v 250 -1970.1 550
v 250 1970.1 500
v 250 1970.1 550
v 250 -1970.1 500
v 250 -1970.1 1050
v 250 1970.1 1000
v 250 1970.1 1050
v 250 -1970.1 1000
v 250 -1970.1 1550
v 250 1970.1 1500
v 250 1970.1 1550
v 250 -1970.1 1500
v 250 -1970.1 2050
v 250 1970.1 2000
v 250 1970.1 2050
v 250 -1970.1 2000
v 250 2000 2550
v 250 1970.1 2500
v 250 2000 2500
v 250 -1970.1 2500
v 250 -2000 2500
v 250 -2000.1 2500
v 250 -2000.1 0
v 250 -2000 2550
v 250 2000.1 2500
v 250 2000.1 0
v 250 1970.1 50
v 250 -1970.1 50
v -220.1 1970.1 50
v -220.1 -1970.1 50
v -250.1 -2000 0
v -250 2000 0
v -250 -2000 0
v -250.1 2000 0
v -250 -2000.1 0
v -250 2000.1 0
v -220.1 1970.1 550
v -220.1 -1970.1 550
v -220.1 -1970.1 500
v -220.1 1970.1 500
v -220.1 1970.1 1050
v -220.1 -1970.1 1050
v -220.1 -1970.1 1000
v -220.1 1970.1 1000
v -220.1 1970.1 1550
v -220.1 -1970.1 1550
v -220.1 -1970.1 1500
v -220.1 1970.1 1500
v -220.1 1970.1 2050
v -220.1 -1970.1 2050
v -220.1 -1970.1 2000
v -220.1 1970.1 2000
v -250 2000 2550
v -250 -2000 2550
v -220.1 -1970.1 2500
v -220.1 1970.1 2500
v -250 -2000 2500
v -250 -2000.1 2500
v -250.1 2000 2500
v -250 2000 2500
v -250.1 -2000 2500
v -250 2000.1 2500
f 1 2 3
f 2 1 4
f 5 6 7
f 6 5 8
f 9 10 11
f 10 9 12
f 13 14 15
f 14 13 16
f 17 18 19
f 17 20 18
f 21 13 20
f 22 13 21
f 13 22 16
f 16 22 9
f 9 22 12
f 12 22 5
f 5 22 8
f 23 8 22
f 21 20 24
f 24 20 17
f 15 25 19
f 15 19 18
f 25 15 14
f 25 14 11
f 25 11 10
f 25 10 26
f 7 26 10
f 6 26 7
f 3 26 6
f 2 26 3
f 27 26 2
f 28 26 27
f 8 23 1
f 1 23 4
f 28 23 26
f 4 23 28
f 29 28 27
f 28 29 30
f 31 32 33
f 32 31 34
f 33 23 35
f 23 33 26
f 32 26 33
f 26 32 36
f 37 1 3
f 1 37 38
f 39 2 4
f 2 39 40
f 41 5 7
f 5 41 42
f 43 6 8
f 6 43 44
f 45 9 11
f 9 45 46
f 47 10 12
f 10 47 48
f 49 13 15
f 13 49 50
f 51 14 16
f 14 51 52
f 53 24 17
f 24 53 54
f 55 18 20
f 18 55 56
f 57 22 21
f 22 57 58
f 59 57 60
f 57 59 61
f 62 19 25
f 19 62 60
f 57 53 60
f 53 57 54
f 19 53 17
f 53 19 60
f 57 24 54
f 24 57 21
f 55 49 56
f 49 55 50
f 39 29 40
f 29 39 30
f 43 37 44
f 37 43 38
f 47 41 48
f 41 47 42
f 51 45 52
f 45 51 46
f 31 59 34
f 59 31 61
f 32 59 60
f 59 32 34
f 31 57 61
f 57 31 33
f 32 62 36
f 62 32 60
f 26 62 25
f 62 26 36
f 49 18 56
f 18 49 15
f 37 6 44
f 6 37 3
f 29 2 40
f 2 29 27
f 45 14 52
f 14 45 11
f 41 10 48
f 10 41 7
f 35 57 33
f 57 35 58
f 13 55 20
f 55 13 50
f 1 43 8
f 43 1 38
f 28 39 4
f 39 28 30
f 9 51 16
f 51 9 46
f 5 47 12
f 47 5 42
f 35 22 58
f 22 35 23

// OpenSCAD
// file: barhocker.scad
//barhocker();
//eps = 1;
//fn = 40;

module barhocker( foot_diameter=500, foot_height=50,
                  foot_rest_diameter = 400, foot_rest_height = 300, foot_rest_thickness = 20,
                  pillar_diameter=70, pillar_height=800,
                  seat_diameter=400, seat_height=130 ) 
{
  color( [0.9, 0.9, 0.9] ) 
    cylinder( d=foot_diameter, h=foot_height, center=false, $fn=fn );
  color( [0.9, 0.9, 0.9] ) 
    translate( [0,0,foot_height-eps] )
      cylinder( d=pillar_diameter, h=pillar_height, center=false, $fn=fn );
  color( [0.9, 0.9, 0.9] ) 
    difference() {
      translate( [0,0,foot_rest_height] )
        cylinder( d=foot_rest_diameter, h=foot_rest_thickness, center=false, $fn=fn );
      translate( [0,0,foot_rest_height-eps] )
        cylinder( d=foot_rest_diameter-2*foot_rest_thickness, 
                  h=foot_rest_thickness+4*eps, center=false, $fn=fn );
      }
  color( [0.6, 0.2, 0.2] ) 
    translate( [0,0,foot_height+pillar_height-eps] )
      cylinder( d=seat_diameter, h=seat_height, center=false, $fn=fn );
}
// main file
fn = 50;
eps = 0.1;

include <barhocker.scad>;



// scale( [0.001, 0.001, 0.001] ) 
  //bartresen();


//translate( [-2.0,0,0] )
//  // scale( [0.001, 0.001, 0.001] ) 
    cupboard();

/*

//translate( [-1.0, -4.0,,0] )
//  scale( [0.001, 0.001, 0.001] ) side_barrier();
translate( [-1.0, +2.5,,0] )
  scale( [0.001, 0.001, 0.001] ) side_barrier();

translate( [1.0, -1.0, 0.0] )
  scale( [0.001, 0.001, 0.001] ) barhocker();
translate( [1.0, 0.0, 0.0] )
  scale( [0.001, 0.001, 0.001] ) barhocker();
translate( [1.0, 1.0, 0.0] )
  scale( [0.001, 0.001, 0.001] ) barhocker();
*/



module bartresen(
  tresen_length = 3000,
  tresen_width  =  800,
  tresen_height = 1200,
  base_height = 50,        // height of bottom/footer part of the Tresen
  counter_height = 100,    // height of upper table-plate of the Tresen
  inset_height = 500, // clear height of one cupboard on robot side
)
{
  dx = 300; 
  difference() {
    union() {
      color( [0.6, 0.4, 0.2] ) 
        translate( [0,0,tresen_height/2] ) 
          cube( size=[tresen_width, tresen_length, tresen_height], center=true );
      color( [0.6, 0.4, 0.2] ) 
        translate( [0,tresen_length/2,tresen_height/2] ) 
          cylinder( d=tresen_width, h=tresen_height-eps, center=true, $fn = fn );
      color( [0.6, 0.4, 0.2] ) 
        translate( [0,-tresen_length/2,tresen_height/2] ) 
          cylinder( d=tresen_width, h=tresen_height-eps, center=true, $fn = fn );
    }
    translate( [tresen_width/2-dx/2+eps,0,tresen_height/2-base_height/2] )
      cube( size=[dx+10*eps, tresen_length+tresen_width+eps, tresen_height-counter_height-base_height], center=true );

    translate( [-tresen_width/2+dx/2-eps,0,base_height+inset_height/2] )
      cube( size=[dx, tresen_length+tresen_width+eps, inset_height], center=true );
    translate( [-tresen_width/2+dx/2-eps,0,base_height+inset_height+base_height+inset_height/2] )
      cube( size=[dx, tresen_length+tresen_width+eps, inset_height], center=true );
     
  }
}


module cupboard(
  cupboard_length= 4000,
  cupboard_width = 500,
  cupboard_height= 2500,
  base_height    = 50,
  inset_height   = 500,
  wall_thickness = 30,
)
{
  color( [0.6, 0.4, 0.2] ) 
    for( dx=[0:inset_height:cupboard_height] )
      translate( [0,0,base_height/2+dx] )
        cube( size=[cupboard_width,cupboard_length,base_height], center=true );
  // rear wall
  color( [0.6, 0.4, 0.2] ) 
    translate( [-cupboard_width/2+wall_thickness/2-eps,0,cupboard_height/2] )
      cube( size=[wall_thickness, cupboard_length, cupboard_height], center=true );  
  // side walls
  color( [0.6, 0.4, 0.2] ) 
    translate( [0,cupboard_length/2-wall_thickness/2+eps,cupboard_height/2] )
      cube( size=[cupboard_width, wall_thickness, cupboard_height], center=true );  
  color( [0.6, 0.4, 0.2] ) 
    translate( [0,-cupboard_length/2+wall_thickness/2-eps,cupboard_height/2] )
      cube( size=[cupboard_width, wall_thickness, cupboard_height], center=true );  
}


module side_barrier(     
  dx = 2000,
  dy = 200,
  dz = 800,
) 
{

  color( [0.8,0.8,0.8] ) 
    translate( [0,0,dz/2] )
      cube( size=[dx,dy,dz], center=true );

}

  
